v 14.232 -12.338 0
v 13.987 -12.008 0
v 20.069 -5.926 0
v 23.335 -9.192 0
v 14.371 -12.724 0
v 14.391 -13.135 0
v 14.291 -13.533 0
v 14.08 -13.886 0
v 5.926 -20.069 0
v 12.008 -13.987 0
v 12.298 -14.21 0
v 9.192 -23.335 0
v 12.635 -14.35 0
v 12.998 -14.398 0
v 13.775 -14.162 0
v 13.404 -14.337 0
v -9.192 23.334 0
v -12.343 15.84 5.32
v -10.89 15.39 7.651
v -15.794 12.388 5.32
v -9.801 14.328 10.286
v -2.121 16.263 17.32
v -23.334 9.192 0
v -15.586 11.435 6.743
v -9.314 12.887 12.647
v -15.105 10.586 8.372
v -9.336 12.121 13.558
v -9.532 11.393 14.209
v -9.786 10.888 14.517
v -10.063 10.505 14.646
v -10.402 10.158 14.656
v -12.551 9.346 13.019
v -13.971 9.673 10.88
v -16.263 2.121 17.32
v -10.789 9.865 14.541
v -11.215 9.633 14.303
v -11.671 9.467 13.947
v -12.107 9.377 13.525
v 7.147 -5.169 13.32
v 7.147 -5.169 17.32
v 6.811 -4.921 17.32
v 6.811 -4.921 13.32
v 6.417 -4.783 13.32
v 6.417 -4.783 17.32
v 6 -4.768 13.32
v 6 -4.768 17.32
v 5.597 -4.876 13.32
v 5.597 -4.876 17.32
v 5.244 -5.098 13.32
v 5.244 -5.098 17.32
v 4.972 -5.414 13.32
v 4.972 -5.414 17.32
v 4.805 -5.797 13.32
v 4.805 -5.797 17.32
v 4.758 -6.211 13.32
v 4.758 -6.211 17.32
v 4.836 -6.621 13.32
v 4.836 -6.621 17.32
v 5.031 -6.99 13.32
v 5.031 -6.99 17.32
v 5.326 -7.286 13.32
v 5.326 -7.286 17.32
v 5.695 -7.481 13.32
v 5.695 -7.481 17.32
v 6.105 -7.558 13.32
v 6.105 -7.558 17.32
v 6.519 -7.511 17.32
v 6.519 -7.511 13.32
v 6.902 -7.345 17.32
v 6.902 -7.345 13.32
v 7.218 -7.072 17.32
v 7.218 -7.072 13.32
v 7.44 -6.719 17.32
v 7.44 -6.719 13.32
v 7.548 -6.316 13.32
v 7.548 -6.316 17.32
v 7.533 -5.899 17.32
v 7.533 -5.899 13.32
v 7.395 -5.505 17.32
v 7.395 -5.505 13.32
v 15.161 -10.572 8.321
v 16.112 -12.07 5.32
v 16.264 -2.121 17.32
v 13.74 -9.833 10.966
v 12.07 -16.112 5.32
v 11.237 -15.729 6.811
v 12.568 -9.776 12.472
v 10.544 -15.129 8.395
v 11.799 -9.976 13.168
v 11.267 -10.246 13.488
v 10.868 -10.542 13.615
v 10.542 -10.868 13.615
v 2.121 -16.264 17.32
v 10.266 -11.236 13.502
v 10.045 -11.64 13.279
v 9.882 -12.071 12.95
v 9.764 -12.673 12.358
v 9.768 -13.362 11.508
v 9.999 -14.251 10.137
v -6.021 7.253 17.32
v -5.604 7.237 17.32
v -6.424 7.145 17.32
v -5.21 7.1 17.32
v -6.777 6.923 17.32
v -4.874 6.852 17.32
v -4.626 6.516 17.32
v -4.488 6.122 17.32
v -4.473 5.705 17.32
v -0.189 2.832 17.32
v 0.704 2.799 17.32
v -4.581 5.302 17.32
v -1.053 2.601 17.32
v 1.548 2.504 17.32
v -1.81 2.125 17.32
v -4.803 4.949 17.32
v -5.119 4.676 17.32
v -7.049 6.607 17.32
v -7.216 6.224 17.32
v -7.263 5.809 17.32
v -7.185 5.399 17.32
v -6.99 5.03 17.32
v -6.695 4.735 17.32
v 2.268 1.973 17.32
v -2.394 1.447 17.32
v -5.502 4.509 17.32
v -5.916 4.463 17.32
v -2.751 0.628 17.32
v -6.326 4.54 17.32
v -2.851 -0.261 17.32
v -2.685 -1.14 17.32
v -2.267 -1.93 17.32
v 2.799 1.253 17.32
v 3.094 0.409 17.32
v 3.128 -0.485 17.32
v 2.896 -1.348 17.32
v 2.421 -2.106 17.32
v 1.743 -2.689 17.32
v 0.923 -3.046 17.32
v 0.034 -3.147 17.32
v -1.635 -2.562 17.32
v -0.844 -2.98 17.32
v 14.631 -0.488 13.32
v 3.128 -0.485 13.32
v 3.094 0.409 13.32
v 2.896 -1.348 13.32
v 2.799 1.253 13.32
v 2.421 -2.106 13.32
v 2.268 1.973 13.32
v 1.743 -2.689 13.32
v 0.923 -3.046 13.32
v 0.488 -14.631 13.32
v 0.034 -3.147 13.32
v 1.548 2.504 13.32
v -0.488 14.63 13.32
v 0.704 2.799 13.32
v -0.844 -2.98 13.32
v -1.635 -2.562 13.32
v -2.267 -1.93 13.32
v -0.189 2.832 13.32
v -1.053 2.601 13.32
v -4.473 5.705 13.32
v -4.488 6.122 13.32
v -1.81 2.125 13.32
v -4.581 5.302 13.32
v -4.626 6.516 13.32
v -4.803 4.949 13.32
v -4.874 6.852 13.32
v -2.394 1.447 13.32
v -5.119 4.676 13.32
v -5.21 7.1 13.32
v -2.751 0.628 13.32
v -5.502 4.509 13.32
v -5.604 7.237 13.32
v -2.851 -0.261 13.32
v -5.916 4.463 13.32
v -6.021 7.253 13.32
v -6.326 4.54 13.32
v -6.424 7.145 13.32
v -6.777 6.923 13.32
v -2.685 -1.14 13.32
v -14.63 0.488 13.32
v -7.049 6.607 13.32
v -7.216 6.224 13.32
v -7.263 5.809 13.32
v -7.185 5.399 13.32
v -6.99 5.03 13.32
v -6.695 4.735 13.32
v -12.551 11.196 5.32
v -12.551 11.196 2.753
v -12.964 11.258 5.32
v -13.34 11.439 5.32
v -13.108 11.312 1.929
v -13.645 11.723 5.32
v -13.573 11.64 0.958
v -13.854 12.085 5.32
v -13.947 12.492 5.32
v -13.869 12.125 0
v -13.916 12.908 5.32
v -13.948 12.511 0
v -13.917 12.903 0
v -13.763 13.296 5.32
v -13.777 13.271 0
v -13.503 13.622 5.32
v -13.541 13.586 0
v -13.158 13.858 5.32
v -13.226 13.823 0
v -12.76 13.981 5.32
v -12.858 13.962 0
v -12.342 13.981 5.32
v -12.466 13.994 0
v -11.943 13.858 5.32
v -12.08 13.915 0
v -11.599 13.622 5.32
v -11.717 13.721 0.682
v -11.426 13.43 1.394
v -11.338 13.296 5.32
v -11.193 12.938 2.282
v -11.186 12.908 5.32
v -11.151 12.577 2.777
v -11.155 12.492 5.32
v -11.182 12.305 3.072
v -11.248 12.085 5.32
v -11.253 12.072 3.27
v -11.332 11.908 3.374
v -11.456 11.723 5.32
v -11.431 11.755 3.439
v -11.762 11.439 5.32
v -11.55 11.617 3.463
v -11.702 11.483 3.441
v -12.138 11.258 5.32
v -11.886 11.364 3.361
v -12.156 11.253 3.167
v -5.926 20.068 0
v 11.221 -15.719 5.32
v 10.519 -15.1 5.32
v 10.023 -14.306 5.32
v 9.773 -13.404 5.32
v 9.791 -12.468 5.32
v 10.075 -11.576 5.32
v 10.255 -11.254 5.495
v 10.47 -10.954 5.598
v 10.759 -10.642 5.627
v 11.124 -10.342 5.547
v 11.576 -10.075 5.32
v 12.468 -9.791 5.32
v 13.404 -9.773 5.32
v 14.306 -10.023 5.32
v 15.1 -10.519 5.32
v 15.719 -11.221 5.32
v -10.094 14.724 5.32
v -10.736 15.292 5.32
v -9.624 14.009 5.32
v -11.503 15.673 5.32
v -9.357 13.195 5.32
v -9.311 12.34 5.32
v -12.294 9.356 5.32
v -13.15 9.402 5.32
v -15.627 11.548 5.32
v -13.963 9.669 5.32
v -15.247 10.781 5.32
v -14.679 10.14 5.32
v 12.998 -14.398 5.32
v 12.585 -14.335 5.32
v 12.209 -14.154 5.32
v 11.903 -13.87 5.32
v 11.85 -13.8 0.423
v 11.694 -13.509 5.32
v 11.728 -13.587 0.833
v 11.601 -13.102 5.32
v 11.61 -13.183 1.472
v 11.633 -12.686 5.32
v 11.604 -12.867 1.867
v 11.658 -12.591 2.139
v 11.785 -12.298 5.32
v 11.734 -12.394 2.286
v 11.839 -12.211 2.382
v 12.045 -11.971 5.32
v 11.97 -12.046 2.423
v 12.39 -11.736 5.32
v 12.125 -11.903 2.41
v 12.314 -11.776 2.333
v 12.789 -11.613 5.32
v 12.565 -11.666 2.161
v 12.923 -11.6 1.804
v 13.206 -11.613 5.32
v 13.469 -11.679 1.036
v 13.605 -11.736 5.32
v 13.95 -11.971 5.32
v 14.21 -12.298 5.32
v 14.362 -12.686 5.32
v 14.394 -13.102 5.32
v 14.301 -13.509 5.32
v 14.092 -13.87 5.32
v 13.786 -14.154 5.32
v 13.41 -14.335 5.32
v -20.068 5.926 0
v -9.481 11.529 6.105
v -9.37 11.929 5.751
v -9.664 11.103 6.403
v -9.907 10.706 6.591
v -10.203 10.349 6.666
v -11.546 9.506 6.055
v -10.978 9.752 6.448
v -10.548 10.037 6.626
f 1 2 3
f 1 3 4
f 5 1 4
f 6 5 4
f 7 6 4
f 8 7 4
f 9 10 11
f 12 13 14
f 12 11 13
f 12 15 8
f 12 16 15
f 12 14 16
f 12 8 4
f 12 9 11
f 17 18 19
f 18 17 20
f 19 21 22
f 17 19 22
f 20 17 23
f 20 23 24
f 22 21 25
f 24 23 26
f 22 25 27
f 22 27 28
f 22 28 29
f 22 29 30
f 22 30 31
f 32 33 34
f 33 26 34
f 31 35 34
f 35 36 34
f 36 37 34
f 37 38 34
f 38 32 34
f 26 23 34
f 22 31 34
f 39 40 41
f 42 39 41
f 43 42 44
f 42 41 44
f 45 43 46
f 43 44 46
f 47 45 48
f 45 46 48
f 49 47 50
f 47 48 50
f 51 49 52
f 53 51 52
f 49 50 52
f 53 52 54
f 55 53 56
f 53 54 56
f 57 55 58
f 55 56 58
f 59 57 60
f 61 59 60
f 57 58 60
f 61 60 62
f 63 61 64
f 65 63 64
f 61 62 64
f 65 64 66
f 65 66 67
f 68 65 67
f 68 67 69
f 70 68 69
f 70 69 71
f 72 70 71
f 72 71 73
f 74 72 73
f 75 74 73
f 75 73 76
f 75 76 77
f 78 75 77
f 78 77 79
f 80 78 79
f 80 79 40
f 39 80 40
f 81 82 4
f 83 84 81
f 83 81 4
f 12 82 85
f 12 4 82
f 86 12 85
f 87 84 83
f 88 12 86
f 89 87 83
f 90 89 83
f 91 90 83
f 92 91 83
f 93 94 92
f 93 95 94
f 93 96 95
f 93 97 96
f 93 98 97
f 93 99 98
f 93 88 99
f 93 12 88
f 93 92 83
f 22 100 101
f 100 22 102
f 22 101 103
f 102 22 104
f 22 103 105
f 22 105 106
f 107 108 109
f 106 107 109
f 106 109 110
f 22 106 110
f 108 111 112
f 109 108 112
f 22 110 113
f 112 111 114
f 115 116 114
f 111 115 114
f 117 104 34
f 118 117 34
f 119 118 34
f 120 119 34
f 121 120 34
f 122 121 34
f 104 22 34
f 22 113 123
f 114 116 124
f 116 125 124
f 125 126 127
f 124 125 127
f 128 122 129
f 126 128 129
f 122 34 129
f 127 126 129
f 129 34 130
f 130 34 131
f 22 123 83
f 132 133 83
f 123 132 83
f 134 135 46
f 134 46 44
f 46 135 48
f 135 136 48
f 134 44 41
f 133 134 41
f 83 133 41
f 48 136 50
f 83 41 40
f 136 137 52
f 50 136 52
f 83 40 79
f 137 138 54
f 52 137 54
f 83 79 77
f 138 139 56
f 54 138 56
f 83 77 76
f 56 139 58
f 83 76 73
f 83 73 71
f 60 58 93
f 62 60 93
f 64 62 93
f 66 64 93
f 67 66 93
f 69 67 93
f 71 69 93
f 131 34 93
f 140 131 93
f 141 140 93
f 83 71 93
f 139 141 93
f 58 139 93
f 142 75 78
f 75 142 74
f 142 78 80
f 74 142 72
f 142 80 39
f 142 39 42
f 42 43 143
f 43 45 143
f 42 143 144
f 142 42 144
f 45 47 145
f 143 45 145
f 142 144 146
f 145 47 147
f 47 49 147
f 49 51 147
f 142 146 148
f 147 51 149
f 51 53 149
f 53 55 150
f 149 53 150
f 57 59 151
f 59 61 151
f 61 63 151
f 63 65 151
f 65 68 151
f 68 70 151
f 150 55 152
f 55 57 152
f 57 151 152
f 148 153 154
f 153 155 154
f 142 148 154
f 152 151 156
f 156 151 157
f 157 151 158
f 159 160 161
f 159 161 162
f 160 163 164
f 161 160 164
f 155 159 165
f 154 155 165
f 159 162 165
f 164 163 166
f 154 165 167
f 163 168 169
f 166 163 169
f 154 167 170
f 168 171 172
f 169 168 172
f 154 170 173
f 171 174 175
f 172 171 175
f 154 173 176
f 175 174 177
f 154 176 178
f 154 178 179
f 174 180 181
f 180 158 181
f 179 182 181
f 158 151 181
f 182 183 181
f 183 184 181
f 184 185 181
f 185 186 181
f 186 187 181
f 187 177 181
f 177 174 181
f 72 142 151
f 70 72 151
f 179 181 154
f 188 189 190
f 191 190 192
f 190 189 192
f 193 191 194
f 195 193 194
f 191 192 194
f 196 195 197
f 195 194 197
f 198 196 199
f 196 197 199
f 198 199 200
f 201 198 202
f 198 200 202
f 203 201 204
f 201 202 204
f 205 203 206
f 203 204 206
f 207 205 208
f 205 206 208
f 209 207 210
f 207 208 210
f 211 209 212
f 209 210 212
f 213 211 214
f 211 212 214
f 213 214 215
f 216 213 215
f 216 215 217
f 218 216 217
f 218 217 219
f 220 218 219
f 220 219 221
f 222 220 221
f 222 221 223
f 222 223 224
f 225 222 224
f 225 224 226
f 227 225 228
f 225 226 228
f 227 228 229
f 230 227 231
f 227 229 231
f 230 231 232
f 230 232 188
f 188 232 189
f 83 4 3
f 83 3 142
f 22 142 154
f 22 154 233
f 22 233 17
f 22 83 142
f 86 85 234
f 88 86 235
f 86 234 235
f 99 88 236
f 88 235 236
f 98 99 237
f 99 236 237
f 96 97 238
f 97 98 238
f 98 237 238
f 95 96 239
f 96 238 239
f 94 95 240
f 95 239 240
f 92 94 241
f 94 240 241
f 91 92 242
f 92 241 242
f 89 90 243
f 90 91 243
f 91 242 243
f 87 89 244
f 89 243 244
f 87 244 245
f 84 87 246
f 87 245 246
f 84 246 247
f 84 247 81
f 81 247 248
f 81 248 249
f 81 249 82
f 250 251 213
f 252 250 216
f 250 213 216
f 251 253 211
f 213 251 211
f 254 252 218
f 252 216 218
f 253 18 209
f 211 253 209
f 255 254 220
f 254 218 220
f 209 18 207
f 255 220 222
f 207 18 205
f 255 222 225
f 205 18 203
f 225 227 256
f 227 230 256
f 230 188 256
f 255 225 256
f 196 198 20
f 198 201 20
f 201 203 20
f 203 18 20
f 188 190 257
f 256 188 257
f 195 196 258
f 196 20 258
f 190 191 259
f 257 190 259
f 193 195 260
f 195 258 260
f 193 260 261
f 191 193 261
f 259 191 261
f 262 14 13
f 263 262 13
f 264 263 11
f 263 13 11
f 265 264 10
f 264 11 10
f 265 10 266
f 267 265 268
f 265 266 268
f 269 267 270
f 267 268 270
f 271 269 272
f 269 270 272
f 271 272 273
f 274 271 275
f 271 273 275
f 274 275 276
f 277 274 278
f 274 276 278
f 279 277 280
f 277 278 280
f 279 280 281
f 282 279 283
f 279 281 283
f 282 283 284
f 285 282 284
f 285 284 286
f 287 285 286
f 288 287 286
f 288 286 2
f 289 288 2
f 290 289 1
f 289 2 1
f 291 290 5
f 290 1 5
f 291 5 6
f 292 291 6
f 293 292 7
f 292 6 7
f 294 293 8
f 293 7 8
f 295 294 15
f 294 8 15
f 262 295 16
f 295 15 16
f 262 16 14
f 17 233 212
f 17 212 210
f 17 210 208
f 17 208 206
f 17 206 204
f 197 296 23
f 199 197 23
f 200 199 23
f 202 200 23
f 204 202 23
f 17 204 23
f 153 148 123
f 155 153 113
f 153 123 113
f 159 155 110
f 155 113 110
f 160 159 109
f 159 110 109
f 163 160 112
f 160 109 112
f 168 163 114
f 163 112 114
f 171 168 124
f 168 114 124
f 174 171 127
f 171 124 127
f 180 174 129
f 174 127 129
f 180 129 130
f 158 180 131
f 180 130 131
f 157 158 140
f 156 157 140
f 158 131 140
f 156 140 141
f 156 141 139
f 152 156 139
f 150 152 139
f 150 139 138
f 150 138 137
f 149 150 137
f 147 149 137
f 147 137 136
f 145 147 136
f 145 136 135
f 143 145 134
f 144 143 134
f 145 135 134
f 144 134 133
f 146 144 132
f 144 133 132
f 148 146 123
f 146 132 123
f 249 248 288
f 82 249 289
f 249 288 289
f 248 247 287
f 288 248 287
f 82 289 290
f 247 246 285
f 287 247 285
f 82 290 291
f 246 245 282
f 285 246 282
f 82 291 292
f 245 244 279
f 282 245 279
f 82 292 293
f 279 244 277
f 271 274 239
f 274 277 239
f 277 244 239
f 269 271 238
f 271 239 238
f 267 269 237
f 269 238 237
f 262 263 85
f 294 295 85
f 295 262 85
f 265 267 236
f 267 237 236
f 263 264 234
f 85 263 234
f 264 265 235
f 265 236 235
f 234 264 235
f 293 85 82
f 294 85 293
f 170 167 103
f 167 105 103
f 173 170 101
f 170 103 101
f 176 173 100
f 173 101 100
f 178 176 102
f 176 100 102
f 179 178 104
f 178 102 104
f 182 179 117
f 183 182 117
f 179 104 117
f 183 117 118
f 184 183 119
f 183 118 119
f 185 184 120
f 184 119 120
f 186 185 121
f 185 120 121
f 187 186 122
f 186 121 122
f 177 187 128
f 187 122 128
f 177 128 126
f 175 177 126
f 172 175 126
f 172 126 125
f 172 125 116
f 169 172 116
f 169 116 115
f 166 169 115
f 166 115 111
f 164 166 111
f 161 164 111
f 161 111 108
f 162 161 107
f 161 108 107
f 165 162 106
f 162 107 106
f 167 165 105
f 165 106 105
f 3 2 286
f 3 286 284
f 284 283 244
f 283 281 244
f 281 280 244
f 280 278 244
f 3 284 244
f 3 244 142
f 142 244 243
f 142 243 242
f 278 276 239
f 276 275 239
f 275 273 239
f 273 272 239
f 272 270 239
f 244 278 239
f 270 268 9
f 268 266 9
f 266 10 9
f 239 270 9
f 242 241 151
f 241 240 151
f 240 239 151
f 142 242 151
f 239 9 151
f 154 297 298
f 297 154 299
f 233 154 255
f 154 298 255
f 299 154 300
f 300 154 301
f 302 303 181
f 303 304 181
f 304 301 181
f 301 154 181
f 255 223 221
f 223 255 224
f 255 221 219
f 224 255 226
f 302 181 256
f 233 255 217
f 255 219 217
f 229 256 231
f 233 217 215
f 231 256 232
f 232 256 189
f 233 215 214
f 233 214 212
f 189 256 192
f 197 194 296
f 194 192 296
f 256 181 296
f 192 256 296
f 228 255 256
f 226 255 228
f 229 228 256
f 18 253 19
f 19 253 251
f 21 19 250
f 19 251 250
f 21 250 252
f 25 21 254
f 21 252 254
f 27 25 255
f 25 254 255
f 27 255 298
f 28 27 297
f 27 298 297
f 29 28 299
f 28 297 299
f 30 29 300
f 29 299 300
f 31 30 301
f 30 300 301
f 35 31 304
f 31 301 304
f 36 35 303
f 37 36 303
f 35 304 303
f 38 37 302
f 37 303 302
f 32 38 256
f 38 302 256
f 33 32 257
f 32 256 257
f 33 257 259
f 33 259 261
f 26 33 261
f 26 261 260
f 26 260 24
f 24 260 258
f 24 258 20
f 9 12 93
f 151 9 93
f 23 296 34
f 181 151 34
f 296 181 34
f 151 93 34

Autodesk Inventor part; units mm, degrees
ref_plane "YZ Plane" through (0, 0, 0) normal (1, 0, 0) x (0, 1, 0)
ref_plane "XZ Plane" through (0, 0, 0) normal (0, 1, 0) x (-1, 0, 0)
ref_plane "Work Plane1" through (0, 0, 0) normal (0, 0, 1) x (1, 0, 0)
ref_plane "Work Plane2" through (0, 0, 0) normal (0, 0, 1) x (1, 0, 0)
ref_plane "Work Plane3" through (18.3844, -18.3844, 0) normal (0.7071, 0.7071, 0) x (-0.7071, 0.7071, 0)
sketch "Sketch2" plane through (18.3844, -18.3844, 0) normal (0.7071, 0.7071, 0) x (-0.7071, 0.7071, 0)
  line L0 (2.9994, 0) -> (12.9994, 17.3205)
  line L1 (-4.0006, 0) -> (15.9994, 0) construction
  line L2 (48.9994, 0) -> (38.9994, 17.3205)
  line L3 (56.0448, 0) -> (76.0448, 0) construction
  line L4 (38.9994, 17.3205) -> (12.9994, 17.3205)
  line L5 (7.6182, 0) -> (15.3088, 13.3205)
  line L6 (15.3088, 13.3205) -> (36.69, 13.3205)
  line L7 (36.69, 13.3205) -> (44.3806, 0)
  line L8 (-17.6765, -6) -> (-19.9184, -71) projected
  line L9 (53.3865, -6) -> (55.409, -71) projected
  line L10 (20.5601, 2) -> (20.5601, 10)
  line L11 (33.5601, 2) -> (33.5601, 10)
  line L12 (48, 0) -> (-12, 0) projected
  line L13 (44.3806, 0) -> (48.9994, 0)
  line L14 (2.9994, 0) -> (7.6182, 0)
  line L15 (-4.0006, -9.8008) -> (-4.0006, -30.1937)
  line L16 (55.9994, -9.8008) -> (55.9994, -30.1937)
  point P0 (25.9994, 0)
  dimension "d1" = 20
  dimension "d2" = 60
  dimension "d3" = 120
  dimension "d5" = 4
  dimension "d6" = 4
  dimension "d7" = 4
  dimension "d24" = 7
  dimension "d25" = 7
extrude "Extrusion1" add sketch "Sketch2" along normal mid plane 20 contours L0 L4 L2 L13 L12 L7 L6 L5
sketch "Sketch3" plane through (16.2635, -2.1213, 17.3205) normal (0, 0, 1) x (0.7071, 0.7071, 0)
  circle A0 centre (-9.3718, 30.7817) radius 1.4 projected
  circle A1 centre (-10.6281, -5.1964) radius 1.4 projected
  line L0 (-20, -5.3812) -> (0, -5.3812) projected
  point P0 (-9.968, 30.7817)
  point P1 (-10, -5.3812)
hole "Hole1" at (-12.5509, 12.5962, 17.3205) at (12.9975, -12.9975, 17.3205) direction (0, 0, -1) diameter 2.8 end through all counterbore diameter 6.5 counterbore depth 12
sketch "Sketch4" plane through (16.2635, -2.1213, 17.3205) normal (0, 0, 1) x (0.7071, 0.7071, 0)
  circle A0 centre (-10.0015, 21.2913) radius 1.9 projected
  line L0 (0, 26) -> (0, 0) projected
  line L1 (-20, 0) -> (-20, 26) projected
  circle A1 centre (-10.0015, 4.2912) radius 1.9 projected
  circle A2 centre (-10.0015, 12.7912) radius 3 projected
  circle A3 centre (-10.0015, 21.2913) radius 1.4
  circle A4 centre (-10.0015, 4.2912) radius 1.9
  circle A5 centre (-10.0015, 4.2912) radius 1.4
  line L2 (-20, 26) -> (0, 26) projected
  line L3 (-20, 0) -> (0, 0) projected
  point P0 (-10, 13)
  dimension "d17" = 2.8
  dimension "d18" = 2.8
extrude "Extrusion2" cut sketch "Sketch4" against normal blind 20 contours A2 | A3 | A5
ref_plane "Arbeitsebene4" through (18.3844, -18.3844, 0) normal (0.7071, 0.7071, 0) x (0, 0, 1)
properties part number "Anglerfish_Lightplate_Tislinkbridge"
